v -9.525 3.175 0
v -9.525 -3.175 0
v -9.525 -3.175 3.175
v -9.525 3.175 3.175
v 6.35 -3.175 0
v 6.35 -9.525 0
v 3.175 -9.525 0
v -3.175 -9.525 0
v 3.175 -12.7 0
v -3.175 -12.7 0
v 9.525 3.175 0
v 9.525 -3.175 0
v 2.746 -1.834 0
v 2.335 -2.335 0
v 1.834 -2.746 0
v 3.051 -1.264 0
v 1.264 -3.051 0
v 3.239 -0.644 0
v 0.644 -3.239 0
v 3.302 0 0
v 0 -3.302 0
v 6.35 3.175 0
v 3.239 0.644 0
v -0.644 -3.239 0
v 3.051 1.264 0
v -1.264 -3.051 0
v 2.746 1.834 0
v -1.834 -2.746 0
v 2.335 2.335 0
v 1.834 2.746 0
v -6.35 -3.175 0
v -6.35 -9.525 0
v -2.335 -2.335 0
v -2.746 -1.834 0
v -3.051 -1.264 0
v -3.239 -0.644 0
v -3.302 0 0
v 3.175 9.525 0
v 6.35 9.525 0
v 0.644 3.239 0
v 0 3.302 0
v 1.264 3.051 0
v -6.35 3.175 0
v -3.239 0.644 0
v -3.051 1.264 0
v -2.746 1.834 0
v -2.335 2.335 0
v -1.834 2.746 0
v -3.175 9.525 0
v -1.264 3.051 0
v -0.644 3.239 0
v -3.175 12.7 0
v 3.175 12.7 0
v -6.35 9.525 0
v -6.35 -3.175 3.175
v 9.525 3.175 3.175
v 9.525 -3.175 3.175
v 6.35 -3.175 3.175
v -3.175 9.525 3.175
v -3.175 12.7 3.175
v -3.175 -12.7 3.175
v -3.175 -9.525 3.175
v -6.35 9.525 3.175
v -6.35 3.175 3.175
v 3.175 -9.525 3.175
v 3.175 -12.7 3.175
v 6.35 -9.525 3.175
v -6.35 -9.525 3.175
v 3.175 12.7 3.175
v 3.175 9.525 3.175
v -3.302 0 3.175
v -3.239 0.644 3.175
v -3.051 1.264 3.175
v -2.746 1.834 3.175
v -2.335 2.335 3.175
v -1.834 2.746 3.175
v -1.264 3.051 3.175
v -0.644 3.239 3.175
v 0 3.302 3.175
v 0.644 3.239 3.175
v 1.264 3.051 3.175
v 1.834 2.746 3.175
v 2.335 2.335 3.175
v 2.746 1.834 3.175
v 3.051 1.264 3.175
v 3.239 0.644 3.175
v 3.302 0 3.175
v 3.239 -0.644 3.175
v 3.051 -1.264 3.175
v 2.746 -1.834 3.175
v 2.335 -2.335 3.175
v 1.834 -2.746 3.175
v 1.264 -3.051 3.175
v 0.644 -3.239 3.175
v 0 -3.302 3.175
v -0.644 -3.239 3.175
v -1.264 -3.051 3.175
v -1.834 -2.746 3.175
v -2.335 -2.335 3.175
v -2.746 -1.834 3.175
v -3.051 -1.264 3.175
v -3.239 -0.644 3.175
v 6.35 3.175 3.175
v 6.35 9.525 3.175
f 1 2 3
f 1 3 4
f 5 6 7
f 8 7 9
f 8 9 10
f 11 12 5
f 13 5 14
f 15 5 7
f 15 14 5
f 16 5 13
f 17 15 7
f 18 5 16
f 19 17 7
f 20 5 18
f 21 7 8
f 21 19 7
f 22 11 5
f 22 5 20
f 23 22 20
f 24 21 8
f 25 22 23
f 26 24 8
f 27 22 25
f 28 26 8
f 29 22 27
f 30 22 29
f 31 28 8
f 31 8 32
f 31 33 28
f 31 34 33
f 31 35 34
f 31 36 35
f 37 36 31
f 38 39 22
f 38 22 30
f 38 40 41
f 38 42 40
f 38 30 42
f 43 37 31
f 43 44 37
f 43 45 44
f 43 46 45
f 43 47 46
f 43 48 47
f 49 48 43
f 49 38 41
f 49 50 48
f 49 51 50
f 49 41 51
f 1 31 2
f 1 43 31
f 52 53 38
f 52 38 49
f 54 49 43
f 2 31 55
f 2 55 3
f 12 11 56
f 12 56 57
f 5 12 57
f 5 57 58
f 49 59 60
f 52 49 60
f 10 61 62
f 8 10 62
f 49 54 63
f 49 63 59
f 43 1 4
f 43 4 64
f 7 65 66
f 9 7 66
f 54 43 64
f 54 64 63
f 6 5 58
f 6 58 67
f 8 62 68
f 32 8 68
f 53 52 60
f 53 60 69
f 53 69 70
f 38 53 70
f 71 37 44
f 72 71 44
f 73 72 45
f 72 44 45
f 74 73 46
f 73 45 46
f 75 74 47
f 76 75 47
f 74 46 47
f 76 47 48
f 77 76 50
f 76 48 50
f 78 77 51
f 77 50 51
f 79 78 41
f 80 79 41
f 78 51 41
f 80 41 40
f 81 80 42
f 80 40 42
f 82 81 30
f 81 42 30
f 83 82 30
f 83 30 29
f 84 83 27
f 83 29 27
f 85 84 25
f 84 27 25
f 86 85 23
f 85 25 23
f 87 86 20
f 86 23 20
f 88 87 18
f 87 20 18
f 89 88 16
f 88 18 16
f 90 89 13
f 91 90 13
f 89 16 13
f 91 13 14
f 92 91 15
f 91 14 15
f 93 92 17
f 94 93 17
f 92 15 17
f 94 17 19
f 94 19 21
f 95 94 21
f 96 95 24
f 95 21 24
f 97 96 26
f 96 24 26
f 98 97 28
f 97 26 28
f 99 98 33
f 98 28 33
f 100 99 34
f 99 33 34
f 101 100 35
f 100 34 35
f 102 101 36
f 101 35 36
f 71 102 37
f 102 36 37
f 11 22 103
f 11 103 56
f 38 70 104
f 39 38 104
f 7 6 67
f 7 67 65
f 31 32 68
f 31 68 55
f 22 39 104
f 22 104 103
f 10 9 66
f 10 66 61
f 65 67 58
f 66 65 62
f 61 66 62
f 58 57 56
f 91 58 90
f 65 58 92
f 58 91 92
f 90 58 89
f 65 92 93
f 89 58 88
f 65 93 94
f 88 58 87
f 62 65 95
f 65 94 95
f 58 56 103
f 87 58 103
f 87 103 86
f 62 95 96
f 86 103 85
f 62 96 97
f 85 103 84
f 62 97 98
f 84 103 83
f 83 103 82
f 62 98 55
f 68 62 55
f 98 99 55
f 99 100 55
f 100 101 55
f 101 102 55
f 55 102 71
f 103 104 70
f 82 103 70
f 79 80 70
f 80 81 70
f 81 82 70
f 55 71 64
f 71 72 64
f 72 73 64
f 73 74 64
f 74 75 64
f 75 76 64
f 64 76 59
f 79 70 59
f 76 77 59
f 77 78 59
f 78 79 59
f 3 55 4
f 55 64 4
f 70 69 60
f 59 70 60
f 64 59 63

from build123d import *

# Parameters (mm, degrees)
EXTRUDE1_DEPTH     = 3.175
SKETCH2_R          = 3.302
CUT_EXTRUDE1_DEPTH = 3.175


with BuildPart() as part:
    # Sketch1 → Extrude1 (new body)
    with BuildSketch(Plane.XY):
        Polygon((3.175, 9.525), (6.35, 9.525), (6.35, 3.175), (9.525, 3.175), (9.525, -3.175), (6.35, -3.175), (6.35, -9.525), (3.175, -9.525), (3.175, -12.7), (-3.175, -12.7), (-3.175, -9.525), (-6.35, -9.525), (-6.35, -3.175), (-9.525, -3.175), (-9.525, 3.175), (-6.35, 3.175), (-6.35, 9.525), (-3.175, 9.525), (-3.175, 12.7), (3.175, 12.7), align=None)
    extrude(amount=EXTRUDE1_DEPTH)

    # Sketch2 → Cut-Extrude1 (cut)
    with BuildSketch(Plane(origin=(0, 0, 0), x_dir=(-1, 0, 0), z_dir=(0, 0, -1))):
        Circle(SKETCH2_R)
    extrude(amount=-CUT_EXTRUDE1_DEPTH, mode=Mode.SUBTRACT)


solid = part.part
